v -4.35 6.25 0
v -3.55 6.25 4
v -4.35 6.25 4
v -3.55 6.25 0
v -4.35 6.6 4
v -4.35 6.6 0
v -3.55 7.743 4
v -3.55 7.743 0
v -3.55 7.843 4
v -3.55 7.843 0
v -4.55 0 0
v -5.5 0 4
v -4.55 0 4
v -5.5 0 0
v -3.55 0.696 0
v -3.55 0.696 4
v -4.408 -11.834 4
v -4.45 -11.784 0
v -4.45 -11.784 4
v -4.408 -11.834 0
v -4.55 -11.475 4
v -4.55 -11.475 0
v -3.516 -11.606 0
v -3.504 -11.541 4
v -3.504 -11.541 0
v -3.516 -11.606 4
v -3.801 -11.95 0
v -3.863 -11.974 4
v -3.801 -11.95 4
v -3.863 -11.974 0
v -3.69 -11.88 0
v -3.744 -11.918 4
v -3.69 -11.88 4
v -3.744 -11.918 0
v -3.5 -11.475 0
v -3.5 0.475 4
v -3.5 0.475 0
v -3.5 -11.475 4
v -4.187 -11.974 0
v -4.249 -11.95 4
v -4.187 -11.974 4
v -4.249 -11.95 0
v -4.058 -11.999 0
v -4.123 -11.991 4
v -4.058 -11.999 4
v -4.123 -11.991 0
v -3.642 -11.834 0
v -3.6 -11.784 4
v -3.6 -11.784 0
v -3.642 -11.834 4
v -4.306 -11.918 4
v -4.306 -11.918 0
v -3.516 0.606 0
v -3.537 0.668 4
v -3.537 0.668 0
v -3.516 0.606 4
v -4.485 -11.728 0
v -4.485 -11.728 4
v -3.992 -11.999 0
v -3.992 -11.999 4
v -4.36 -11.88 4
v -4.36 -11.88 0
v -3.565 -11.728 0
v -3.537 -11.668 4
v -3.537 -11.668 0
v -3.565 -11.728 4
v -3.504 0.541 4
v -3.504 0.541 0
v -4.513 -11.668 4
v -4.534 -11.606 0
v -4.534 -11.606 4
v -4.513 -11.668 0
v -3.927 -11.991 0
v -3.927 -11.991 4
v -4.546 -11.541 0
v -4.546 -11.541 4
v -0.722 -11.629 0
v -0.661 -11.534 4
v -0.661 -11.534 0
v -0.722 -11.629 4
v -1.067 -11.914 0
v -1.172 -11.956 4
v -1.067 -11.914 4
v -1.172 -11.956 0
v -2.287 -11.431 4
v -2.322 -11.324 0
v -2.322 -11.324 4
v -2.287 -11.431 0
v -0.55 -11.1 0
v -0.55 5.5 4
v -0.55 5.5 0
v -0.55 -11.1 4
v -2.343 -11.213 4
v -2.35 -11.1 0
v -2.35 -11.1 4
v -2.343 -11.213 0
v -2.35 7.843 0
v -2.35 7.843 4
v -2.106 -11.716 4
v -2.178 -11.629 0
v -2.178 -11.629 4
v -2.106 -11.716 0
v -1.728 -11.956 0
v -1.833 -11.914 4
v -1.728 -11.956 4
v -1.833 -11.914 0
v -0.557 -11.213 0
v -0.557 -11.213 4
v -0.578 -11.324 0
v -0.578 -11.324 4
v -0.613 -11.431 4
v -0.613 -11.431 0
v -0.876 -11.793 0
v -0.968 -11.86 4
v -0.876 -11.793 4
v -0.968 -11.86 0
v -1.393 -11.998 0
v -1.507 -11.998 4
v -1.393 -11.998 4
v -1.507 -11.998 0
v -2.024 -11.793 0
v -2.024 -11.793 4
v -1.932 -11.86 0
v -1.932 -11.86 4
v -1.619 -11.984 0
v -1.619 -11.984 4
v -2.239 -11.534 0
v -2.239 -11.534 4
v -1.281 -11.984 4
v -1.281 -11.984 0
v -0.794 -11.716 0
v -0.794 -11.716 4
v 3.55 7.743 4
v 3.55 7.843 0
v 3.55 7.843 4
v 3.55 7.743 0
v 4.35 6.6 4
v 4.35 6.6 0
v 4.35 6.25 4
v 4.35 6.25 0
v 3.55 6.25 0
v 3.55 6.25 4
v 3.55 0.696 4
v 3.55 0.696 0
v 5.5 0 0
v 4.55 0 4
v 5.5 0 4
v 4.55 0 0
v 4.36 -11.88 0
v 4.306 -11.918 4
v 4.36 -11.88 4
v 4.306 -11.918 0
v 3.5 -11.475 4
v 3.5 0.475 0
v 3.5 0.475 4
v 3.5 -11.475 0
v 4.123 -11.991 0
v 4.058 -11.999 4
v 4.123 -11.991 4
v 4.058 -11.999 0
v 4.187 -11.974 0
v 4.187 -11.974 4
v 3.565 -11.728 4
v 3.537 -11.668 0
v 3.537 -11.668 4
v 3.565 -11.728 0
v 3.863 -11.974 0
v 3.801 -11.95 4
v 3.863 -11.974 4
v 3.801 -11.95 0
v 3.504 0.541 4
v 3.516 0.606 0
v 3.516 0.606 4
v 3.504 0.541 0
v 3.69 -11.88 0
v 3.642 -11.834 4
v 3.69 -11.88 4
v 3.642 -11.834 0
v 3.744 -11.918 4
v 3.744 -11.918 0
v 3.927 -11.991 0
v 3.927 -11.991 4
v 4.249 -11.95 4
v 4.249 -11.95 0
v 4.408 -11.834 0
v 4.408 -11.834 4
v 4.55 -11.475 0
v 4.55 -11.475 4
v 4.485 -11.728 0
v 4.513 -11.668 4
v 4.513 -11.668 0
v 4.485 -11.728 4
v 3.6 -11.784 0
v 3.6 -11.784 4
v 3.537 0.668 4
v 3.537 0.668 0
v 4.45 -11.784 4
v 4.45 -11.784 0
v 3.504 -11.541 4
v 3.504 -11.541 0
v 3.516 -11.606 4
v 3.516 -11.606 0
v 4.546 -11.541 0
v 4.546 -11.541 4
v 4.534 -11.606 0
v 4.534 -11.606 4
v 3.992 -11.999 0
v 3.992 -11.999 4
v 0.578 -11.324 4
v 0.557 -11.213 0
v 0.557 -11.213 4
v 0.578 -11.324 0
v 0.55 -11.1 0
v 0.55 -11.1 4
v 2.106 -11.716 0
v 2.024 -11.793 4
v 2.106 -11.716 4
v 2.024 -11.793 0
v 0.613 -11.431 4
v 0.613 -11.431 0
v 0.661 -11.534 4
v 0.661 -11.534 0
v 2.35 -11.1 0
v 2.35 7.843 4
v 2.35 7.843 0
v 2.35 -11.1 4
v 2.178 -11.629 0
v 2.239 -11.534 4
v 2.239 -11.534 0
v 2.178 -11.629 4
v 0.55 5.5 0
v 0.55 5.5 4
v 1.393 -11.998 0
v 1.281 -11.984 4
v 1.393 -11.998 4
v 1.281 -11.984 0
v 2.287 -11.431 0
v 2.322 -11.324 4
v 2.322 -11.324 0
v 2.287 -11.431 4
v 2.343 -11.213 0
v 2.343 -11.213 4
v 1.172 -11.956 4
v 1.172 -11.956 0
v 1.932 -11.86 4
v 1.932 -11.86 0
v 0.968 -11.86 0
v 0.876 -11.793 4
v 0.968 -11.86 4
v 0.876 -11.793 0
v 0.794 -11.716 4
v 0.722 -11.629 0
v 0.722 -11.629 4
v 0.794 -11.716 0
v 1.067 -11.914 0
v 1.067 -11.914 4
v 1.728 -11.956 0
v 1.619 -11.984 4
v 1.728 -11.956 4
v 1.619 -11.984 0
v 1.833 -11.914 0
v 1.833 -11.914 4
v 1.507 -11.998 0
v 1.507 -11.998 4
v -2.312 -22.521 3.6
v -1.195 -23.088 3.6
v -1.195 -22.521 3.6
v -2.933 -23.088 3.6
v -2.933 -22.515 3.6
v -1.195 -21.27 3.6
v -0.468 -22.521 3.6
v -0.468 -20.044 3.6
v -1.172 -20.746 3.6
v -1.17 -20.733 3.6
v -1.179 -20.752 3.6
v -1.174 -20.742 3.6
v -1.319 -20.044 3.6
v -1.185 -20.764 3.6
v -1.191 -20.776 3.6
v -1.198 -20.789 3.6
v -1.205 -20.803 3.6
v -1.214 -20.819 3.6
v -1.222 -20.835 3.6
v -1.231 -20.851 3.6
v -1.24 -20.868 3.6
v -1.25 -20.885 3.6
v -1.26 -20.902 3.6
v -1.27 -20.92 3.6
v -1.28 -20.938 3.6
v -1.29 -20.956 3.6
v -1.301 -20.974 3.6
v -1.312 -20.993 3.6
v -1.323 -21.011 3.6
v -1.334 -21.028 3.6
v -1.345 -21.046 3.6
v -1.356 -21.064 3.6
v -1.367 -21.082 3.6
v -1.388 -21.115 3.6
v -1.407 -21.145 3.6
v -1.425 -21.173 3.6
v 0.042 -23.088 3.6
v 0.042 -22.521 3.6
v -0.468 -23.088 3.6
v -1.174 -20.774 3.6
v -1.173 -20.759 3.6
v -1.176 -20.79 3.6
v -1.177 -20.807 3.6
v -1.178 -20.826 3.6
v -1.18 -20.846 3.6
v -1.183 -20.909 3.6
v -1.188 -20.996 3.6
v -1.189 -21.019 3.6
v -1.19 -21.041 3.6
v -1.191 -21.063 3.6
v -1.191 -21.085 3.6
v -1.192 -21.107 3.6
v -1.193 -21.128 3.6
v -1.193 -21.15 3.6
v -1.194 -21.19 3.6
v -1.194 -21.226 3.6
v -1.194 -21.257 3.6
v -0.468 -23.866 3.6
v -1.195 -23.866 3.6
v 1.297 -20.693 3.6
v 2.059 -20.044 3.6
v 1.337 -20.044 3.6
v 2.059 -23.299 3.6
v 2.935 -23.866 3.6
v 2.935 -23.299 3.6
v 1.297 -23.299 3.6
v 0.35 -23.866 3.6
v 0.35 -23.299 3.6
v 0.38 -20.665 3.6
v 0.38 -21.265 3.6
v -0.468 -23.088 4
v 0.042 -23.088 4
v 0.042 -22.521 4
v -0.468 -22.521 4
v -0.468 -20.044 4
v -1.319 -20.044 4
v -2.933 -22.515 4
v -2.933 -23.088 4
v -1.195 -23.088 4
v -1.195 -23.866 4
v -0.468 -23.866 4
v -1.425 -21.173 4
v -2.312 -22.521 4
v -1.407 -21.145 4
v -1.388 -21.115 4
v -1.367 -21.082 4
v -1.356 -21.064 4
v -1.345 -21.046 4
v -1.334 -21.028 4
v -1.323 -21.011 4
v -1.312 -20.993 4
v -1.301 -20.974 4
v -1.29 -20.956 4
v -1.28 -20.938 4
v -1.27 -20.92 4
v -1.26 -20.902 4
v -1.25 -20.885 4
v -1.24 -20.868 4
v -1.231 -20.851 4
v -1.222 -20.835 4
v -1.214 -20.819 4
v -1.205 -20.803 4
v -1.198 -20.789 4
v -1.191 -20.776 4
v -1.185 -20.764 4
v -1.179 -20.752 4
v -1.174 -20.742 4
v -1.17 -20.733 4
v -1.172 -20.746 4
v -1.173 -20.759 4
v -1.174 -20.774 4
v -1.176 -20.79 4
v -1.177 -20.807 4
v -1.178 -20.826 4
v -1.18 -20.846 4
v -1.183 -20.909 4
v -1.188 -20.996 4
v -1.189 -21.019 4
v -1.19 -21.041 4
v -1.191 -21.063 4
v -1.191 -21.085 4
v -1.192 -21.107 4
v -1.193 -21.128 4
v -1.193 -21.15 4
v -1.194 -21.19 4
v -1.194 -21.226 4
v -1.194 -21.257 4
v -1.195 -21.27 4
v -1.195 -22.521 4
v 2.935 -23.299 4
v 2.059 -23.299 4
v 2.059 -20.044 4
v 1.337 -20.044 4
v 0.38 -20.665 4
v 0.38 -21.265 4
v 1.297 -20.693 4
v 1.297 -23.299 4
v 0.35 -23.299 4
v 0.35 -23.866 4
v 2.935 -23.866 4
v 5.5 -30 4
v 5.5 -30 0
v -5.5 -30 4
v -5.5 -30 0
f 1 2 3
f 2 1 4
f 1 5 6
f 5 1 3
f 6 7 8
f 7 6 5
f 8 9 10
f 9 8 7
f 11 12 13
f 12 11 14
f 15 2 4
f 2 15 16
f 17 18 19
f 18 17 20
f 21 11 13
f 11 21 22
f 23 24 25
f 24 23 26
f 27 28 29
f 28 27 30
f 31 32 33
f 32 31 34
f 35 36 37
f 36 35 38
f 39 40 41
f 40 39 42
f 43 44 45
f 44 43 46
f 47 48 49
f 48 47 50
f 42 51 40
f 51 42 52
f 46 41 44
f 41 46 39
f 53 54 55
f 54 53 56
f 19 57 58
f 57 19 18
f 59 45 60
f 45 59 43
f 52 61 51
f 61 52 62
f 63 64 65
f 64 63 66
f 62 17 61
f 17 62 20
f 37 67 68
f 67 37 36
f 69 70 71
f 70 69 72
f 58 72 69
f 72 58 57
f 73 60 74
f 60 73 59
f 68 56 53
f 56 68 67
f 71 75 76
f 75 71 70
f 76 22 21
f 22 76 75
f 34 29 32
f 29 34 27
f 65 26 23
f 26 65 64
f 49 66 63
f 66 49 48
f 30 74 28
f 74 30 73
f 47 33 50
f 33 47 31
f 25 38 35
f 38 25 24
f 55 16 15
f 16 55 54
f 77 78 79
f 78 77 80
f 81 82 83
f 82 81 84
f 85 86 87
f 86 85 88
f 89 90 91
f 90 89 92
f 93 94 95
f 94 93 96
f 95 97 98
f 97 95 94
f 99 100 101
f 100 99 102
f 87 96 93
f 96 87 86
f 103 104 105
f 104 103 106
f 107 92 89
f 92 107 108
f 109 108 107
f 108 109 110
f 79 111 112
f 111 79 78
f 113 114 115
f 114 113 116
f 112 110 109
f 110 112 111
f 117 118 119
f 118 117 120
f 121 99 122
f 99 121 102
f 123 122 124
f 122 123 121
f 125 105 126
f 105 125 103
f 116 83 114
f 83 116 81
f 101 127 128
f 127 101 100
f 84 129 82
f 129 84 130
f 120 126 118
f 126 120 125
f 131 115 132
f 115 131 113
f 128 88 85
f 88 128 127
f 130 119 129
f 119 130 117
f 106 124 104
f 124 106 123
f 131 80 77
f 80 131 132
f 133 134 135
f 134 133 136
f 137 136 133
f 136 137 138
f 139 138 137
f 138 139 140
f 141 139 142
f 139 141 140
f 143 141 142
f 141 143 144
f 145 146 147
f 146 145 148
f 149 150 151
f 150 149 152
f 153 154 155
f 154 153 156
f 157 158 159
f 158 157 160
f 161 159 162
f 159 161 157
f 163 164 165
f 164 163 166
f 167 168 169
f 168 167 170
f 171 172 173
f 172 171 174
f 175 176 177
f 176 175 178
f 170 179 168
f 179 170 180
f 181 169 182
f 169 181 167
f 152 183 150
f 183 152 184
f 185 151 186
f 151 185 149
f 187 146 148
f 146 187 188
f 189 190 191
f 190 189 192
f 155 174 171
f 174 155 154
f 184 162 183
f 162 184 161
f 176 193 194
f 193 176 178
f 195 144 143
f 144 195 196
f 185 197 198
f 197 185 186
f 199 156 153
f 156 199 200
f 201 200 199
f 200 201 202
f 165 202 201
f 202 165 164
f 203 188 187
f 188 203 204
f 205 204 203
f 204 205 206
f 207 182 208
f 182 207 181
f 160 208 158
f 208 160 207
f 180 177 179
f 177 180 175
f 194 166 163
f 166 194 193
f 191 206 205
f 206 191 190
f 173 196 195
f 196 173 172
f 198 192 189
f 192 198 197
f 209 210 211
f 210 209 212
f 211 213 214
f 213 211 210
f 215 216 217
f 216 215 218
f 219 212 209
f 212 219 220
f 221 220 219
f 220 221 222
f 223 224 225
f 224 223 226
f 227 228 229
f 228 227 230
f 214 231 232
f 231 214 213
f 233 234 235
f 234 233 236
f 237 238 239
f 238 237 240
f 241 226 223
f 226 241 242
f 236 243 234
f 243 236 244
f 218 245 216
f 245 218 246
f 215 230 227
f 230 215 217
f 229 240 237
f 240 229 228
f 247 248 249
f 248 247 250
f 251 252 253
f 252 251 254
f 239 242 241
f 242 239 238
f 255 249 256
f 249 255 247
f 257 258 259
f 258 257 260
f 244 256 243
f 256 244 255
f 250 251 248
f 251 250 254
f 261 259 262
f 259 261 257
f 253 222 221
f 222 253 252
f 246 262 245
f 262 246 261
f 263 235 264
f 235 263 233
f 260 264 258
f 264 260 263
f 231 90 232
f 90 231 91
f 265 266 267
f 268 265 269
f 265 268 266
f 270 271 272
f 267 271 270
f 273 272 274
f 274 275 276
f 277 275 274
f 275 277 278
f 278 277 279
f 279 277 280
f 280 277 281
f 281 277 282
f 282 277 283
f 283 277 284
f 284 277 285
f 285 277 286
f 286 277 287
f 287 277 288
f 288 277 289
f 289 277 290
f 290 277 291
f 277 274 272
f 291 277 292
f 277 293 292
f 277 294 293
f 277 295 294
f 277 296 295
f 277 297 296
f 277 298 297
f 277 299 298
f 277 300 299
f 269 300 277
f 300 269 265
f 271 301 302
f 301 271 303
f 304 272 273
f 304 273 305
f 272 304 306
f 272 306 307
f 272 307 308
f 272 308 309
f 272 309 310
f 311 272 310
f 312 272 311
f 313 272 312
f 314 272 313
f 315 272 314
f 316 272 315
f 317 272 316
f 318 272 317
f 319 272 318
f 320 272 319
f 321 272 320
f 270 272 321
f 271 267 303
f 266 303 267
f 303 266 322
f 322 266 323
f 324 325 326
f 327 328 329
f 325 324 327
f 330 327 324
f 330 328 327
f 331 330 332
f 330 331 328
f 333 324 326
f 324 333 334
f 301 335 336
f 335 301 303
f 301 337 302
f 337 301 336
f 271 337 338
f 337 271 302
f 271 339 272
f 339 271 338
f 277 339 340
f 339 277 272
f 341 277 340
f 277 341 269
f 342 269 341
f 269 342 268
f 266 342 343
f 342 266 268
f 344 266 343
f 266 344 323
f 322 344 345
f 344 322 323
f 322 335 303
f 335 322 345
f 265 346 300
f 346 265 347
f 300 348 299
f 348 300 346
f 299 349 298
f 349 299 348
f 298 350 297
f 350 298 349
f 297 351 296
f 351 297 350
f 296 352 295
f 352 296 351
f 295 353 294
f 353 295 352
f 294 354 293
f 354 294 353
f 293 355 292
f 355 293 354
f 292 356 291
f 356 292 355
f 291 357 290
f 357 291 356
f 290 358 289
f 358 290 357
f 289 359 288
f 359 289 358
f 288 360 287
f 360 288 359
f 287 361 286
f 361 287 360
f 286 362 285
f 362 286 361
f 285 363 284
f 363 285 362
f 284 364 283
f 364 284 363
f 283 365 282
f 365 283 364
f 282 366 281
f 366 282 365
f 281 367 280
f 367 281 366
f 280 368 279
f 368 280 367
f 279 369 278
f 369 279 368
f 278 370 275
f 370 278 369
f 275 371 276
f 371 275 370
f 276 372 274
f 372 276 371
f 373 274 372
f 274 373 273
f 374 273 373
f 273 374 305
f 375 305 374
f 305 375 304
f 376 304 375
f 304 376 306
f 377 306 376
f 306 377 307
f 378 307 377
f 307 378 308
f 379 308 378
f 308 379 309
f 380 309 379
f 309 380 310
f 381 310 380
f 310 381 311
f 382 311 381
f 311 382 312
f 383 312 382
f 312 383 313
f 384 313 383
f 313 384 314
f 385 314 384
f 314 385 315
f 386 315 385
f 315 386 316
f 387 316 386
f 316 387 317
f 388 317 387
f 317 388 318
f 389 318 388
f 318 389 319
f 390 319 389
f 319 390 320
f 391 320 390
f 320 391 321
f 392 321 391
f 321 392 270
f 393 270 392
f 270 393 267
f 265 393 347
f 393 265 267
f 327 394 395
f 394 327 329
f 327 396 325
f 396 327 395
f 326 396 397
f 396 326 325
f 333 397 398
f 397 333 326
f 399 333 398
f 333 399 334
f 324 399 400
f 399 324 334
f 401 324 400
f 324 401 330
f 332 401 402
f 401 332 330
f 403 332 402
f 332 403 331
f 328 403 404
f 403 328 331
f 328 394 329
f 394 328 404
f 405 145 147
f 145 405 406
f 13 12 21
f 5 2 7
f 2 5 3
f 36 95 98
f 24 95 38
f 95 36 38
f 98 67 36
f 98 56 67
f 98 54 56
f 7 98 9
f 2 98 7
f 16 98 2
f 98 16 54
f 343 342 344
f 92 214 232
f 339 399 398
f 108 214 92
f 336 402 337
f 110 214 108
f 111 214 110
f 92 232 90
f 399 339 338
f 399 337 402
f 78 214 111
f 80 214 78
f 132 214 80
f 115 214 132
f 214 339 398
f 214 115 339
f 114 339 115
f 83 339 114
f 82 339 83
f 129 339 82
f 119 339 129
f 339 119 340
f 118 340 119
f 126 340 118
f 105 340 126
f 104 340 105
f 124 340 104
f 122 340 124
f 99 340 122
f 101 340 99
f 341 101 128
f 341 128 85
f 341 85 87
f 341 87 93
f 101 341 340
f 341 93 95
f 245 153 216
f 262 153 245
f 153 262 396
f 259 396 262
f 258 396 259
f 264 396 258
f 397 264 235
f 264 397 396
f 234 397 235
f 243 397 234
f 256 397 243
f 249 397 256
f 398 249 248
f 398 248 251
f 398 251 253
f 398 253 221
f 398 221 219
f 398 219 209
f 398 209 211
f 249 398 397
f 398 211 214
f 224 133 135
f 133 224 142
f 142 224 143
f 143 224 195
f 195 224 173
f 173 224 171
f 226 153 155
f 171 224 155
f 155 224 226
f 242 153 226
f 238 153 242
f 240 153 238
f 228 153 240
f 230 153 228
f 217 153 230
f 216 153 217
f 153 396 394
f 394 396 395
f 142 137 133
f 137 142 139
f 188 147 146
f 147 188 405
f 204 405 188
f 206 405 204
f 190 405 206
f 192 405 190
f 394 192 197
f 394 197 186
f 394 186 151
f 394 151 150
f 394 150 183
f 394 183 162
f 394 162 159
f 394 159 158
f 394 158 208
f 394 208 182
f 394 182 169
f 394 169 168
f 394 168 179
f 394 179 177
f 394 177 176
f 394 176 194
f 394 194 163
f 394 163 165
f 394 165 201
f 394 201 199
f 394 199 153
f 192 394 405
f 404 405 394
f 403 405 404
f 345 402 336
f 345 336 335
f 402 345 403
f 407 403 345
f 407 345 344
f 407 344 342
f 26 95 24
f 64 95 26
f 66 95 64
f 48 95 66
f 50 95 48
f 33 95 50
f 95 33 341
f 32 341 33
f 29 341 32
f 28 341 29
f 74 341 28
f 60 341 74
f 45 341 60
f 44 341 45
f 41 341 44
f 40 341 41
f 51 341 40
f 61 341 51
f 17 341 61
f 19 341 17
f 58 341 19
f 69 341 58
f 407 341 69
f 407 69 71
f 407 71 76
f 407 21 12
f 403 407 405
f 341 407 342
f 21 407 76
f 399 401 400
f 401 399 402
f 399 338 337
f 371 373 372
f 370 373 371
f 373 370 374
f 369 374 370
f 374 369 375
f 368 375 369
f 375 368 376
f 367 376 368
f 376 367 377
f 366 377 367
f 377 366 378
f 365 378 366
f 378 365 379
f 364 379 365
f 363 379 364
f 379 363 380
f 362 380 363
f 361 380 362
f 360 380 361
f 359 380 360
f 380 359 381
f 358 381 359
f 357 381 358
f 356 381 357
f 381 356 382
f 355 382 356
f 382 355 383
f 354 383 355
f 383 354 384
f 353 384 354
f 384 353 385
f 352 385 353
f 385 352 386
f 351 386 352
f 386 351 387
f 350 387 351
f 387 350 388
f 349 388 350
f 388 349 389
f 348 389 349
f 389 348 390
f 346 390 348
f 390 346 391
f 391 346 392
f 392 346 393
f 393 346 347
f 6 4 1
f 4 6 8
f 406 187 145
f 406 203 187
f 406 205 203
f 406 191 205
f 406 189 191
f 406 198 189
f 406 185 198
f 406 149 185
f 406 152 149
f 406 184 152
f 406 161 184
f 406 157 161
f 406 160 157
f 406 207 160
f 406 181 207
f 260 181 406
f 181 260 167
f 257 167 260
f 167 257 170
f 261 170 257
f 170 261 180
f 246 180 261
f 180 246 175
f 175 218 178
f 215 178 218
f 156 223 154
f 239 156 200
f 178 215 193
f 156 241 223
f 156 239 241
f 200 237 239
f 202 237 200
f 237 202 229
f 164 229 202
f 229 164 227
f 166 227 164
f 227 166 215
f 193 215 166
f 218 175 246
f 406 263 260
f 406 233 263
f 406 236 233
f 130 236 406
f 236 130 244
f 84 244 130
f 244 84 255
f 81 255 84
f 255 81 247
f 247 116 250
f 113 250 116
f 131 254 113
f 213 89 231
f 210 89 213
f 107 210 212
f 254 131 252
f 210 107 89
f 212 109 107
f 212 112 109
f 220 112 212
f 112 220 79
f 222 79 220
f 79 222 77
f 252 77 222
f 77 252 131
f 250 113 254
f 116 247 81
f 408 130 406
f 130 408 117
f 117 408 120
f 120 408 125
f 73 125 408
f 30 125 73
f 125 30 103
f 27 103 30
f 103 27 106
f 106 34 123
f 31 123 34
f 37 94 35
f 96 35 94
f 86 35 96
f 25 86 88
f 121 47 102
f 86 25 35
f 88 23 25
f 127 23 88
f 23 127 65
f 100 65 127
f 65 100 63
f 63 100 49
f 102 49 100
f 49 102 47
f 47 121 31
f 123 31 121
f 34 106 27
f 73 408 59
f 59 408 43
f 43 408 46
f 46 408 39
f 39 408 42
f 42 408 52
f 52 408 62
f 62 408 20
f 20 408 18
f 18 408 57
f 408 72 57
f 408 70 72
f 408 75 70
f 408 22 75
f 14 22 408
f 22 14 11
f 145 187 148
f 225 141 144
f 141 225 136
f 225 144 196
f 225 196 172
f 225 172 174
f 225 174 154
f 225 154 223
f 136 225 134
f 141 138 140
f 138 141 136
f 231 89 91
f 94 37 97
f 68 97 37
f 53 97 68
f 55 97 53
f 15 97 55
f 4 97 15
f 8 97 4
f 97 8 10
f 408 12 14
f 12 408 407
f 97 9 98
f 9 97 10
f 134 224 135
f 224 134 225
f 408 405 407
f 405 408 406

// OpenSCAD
$fn = 50;

difference() {
	union() {
		translate(v = [0, 0, 0]) {
			rotate(a = [0, 0, 0]) {
				difference() {
					union() {
						translate(v = [-5.5, -30.0, 0]) {
							cube(size = [11.0, 37.84251840539369, 4.0]);
						}
					}
					union() {
						translate(v = [0, 0, -0.1]) {
							linear_extrude(height = 4.2) {
								polygon(points = [[-3.55, 0], [-3.55, 6.25], [-4.35, 6.25], [-4.35, 6.6], [-3.55, 7.7425184053936915], [-3.55, 8.84251840539369], [-5.7, 8.84251840539369], [-5.7, 0]]);
							}
						}
						translate(v = [-4.0249999999999995, -5.5, -0.1]) {
							hull() {
								translate(v = [-0.0, 5.975, 0]) {
									cylinder(h = 4.2, r = 0.525);
								}
								translate(v = [0.0, 5.975, 0]) {
									cylinder(h = 4.2, r = 0.525);
								}
								translate(v = [-0.0, -5.975, 0]) {
									cylinder(h = 4.2, r = 0.525);
								}
								translate(v = [0.0, -5.975, 0]) {
									cylinder(h = 4.2, r = 0.525);
								}
							}
						}
						translate(v = [-1.4499999999999997, -1.5787407973031549, -0.1]) {
							hull() {
								translate(v = [-0.0, 9.521259202696845, 0]) {
									cylinder(h = 4.2, r = 0.8999999999999998);
								}
								translate(v = [0.0, 9.521259202696845, 0]) {
									cylinder(h = 4.2, r = 0.8999999999999998);
								}
								translate(v = [-0.0, -9.521259202696845, 0]) {
									cylinder(h = 4.2, r = 0.8999999999999998);
								}
								translate(v = [0.0, -9.521259202696845, 0]) {
									cylinder(h = 4.2, r = 0.8999999999999998);
								}
							}
						}
						translate(v = [0, 0, -0.1]) {
							linear_extrude(height = 4.2) {
								polygon(points = [[3.55, 0], [3.55, 6.25], [4.35, 6.25], [4.35, 6.6], [3.55, 7.7425184053936915], [3.55, 8.84251840539369], [5.7, 8.84251840539369], [5.7, 0]]);
							}
						}
						translate(v = [4.0249999999999995, -5.5, -0.1]) {
							hull() {
								translate(v = [-0.0, 5.975, 0]) {
									cylinder(h = 4.2, r = 0.525);
								}
								translate(v = [0.0, 5.975, 0]) {
									cylinder(h = 4.2, r = 0.525);
								}
								translate(v = [-0.0, -5.975, 0]) {
									cylinder(h = 4.2, r = 0.525);
								}
								translate(v = [0.0, -5.975, 0]) {
									cylinder(h = 4.2, r = 0.525);
								}
							}
						}
						translate(v = [1.4499999999999997, -1.5787407973031549, -0.1]) {
							hull() {
								translate(v = [-0.0, 9.521259202696845, 0]) {
									cylinder(h = 4.2, r = 0.8999999999999998);
								}
								translate(v = [0.0, 9.521259202696845, 0]) {
									cylinder(h = 4.2, r = 0.8999999999999998);
								}
								translate(v = [-0.0, -9.521259202696845, 0]) {
									cylinder(h = 4.2, r = 0.8999999999999998);
								}
								translate(v = [0.0, -9.521259202696845, 0]) {
									cylinder(h = 4.2, r = 0.8999999999999998);
								}
							}
						}
						translate(v = [-0.6000000000000001, 5.5, -0.1]) {
							cube(size = [1.2000000000000002, 3.342518405393691, 4.2]);
						}
						translate(v = [0, -22, 3.6]) {
							linear_extrude(height = 0.5) {
								text(font = "Arial:style=Bold", halign = "center", size = 4.0, text = "41", valign = "center");
							}
						}
					}
				}
			}
		}
	}
	union();
}
